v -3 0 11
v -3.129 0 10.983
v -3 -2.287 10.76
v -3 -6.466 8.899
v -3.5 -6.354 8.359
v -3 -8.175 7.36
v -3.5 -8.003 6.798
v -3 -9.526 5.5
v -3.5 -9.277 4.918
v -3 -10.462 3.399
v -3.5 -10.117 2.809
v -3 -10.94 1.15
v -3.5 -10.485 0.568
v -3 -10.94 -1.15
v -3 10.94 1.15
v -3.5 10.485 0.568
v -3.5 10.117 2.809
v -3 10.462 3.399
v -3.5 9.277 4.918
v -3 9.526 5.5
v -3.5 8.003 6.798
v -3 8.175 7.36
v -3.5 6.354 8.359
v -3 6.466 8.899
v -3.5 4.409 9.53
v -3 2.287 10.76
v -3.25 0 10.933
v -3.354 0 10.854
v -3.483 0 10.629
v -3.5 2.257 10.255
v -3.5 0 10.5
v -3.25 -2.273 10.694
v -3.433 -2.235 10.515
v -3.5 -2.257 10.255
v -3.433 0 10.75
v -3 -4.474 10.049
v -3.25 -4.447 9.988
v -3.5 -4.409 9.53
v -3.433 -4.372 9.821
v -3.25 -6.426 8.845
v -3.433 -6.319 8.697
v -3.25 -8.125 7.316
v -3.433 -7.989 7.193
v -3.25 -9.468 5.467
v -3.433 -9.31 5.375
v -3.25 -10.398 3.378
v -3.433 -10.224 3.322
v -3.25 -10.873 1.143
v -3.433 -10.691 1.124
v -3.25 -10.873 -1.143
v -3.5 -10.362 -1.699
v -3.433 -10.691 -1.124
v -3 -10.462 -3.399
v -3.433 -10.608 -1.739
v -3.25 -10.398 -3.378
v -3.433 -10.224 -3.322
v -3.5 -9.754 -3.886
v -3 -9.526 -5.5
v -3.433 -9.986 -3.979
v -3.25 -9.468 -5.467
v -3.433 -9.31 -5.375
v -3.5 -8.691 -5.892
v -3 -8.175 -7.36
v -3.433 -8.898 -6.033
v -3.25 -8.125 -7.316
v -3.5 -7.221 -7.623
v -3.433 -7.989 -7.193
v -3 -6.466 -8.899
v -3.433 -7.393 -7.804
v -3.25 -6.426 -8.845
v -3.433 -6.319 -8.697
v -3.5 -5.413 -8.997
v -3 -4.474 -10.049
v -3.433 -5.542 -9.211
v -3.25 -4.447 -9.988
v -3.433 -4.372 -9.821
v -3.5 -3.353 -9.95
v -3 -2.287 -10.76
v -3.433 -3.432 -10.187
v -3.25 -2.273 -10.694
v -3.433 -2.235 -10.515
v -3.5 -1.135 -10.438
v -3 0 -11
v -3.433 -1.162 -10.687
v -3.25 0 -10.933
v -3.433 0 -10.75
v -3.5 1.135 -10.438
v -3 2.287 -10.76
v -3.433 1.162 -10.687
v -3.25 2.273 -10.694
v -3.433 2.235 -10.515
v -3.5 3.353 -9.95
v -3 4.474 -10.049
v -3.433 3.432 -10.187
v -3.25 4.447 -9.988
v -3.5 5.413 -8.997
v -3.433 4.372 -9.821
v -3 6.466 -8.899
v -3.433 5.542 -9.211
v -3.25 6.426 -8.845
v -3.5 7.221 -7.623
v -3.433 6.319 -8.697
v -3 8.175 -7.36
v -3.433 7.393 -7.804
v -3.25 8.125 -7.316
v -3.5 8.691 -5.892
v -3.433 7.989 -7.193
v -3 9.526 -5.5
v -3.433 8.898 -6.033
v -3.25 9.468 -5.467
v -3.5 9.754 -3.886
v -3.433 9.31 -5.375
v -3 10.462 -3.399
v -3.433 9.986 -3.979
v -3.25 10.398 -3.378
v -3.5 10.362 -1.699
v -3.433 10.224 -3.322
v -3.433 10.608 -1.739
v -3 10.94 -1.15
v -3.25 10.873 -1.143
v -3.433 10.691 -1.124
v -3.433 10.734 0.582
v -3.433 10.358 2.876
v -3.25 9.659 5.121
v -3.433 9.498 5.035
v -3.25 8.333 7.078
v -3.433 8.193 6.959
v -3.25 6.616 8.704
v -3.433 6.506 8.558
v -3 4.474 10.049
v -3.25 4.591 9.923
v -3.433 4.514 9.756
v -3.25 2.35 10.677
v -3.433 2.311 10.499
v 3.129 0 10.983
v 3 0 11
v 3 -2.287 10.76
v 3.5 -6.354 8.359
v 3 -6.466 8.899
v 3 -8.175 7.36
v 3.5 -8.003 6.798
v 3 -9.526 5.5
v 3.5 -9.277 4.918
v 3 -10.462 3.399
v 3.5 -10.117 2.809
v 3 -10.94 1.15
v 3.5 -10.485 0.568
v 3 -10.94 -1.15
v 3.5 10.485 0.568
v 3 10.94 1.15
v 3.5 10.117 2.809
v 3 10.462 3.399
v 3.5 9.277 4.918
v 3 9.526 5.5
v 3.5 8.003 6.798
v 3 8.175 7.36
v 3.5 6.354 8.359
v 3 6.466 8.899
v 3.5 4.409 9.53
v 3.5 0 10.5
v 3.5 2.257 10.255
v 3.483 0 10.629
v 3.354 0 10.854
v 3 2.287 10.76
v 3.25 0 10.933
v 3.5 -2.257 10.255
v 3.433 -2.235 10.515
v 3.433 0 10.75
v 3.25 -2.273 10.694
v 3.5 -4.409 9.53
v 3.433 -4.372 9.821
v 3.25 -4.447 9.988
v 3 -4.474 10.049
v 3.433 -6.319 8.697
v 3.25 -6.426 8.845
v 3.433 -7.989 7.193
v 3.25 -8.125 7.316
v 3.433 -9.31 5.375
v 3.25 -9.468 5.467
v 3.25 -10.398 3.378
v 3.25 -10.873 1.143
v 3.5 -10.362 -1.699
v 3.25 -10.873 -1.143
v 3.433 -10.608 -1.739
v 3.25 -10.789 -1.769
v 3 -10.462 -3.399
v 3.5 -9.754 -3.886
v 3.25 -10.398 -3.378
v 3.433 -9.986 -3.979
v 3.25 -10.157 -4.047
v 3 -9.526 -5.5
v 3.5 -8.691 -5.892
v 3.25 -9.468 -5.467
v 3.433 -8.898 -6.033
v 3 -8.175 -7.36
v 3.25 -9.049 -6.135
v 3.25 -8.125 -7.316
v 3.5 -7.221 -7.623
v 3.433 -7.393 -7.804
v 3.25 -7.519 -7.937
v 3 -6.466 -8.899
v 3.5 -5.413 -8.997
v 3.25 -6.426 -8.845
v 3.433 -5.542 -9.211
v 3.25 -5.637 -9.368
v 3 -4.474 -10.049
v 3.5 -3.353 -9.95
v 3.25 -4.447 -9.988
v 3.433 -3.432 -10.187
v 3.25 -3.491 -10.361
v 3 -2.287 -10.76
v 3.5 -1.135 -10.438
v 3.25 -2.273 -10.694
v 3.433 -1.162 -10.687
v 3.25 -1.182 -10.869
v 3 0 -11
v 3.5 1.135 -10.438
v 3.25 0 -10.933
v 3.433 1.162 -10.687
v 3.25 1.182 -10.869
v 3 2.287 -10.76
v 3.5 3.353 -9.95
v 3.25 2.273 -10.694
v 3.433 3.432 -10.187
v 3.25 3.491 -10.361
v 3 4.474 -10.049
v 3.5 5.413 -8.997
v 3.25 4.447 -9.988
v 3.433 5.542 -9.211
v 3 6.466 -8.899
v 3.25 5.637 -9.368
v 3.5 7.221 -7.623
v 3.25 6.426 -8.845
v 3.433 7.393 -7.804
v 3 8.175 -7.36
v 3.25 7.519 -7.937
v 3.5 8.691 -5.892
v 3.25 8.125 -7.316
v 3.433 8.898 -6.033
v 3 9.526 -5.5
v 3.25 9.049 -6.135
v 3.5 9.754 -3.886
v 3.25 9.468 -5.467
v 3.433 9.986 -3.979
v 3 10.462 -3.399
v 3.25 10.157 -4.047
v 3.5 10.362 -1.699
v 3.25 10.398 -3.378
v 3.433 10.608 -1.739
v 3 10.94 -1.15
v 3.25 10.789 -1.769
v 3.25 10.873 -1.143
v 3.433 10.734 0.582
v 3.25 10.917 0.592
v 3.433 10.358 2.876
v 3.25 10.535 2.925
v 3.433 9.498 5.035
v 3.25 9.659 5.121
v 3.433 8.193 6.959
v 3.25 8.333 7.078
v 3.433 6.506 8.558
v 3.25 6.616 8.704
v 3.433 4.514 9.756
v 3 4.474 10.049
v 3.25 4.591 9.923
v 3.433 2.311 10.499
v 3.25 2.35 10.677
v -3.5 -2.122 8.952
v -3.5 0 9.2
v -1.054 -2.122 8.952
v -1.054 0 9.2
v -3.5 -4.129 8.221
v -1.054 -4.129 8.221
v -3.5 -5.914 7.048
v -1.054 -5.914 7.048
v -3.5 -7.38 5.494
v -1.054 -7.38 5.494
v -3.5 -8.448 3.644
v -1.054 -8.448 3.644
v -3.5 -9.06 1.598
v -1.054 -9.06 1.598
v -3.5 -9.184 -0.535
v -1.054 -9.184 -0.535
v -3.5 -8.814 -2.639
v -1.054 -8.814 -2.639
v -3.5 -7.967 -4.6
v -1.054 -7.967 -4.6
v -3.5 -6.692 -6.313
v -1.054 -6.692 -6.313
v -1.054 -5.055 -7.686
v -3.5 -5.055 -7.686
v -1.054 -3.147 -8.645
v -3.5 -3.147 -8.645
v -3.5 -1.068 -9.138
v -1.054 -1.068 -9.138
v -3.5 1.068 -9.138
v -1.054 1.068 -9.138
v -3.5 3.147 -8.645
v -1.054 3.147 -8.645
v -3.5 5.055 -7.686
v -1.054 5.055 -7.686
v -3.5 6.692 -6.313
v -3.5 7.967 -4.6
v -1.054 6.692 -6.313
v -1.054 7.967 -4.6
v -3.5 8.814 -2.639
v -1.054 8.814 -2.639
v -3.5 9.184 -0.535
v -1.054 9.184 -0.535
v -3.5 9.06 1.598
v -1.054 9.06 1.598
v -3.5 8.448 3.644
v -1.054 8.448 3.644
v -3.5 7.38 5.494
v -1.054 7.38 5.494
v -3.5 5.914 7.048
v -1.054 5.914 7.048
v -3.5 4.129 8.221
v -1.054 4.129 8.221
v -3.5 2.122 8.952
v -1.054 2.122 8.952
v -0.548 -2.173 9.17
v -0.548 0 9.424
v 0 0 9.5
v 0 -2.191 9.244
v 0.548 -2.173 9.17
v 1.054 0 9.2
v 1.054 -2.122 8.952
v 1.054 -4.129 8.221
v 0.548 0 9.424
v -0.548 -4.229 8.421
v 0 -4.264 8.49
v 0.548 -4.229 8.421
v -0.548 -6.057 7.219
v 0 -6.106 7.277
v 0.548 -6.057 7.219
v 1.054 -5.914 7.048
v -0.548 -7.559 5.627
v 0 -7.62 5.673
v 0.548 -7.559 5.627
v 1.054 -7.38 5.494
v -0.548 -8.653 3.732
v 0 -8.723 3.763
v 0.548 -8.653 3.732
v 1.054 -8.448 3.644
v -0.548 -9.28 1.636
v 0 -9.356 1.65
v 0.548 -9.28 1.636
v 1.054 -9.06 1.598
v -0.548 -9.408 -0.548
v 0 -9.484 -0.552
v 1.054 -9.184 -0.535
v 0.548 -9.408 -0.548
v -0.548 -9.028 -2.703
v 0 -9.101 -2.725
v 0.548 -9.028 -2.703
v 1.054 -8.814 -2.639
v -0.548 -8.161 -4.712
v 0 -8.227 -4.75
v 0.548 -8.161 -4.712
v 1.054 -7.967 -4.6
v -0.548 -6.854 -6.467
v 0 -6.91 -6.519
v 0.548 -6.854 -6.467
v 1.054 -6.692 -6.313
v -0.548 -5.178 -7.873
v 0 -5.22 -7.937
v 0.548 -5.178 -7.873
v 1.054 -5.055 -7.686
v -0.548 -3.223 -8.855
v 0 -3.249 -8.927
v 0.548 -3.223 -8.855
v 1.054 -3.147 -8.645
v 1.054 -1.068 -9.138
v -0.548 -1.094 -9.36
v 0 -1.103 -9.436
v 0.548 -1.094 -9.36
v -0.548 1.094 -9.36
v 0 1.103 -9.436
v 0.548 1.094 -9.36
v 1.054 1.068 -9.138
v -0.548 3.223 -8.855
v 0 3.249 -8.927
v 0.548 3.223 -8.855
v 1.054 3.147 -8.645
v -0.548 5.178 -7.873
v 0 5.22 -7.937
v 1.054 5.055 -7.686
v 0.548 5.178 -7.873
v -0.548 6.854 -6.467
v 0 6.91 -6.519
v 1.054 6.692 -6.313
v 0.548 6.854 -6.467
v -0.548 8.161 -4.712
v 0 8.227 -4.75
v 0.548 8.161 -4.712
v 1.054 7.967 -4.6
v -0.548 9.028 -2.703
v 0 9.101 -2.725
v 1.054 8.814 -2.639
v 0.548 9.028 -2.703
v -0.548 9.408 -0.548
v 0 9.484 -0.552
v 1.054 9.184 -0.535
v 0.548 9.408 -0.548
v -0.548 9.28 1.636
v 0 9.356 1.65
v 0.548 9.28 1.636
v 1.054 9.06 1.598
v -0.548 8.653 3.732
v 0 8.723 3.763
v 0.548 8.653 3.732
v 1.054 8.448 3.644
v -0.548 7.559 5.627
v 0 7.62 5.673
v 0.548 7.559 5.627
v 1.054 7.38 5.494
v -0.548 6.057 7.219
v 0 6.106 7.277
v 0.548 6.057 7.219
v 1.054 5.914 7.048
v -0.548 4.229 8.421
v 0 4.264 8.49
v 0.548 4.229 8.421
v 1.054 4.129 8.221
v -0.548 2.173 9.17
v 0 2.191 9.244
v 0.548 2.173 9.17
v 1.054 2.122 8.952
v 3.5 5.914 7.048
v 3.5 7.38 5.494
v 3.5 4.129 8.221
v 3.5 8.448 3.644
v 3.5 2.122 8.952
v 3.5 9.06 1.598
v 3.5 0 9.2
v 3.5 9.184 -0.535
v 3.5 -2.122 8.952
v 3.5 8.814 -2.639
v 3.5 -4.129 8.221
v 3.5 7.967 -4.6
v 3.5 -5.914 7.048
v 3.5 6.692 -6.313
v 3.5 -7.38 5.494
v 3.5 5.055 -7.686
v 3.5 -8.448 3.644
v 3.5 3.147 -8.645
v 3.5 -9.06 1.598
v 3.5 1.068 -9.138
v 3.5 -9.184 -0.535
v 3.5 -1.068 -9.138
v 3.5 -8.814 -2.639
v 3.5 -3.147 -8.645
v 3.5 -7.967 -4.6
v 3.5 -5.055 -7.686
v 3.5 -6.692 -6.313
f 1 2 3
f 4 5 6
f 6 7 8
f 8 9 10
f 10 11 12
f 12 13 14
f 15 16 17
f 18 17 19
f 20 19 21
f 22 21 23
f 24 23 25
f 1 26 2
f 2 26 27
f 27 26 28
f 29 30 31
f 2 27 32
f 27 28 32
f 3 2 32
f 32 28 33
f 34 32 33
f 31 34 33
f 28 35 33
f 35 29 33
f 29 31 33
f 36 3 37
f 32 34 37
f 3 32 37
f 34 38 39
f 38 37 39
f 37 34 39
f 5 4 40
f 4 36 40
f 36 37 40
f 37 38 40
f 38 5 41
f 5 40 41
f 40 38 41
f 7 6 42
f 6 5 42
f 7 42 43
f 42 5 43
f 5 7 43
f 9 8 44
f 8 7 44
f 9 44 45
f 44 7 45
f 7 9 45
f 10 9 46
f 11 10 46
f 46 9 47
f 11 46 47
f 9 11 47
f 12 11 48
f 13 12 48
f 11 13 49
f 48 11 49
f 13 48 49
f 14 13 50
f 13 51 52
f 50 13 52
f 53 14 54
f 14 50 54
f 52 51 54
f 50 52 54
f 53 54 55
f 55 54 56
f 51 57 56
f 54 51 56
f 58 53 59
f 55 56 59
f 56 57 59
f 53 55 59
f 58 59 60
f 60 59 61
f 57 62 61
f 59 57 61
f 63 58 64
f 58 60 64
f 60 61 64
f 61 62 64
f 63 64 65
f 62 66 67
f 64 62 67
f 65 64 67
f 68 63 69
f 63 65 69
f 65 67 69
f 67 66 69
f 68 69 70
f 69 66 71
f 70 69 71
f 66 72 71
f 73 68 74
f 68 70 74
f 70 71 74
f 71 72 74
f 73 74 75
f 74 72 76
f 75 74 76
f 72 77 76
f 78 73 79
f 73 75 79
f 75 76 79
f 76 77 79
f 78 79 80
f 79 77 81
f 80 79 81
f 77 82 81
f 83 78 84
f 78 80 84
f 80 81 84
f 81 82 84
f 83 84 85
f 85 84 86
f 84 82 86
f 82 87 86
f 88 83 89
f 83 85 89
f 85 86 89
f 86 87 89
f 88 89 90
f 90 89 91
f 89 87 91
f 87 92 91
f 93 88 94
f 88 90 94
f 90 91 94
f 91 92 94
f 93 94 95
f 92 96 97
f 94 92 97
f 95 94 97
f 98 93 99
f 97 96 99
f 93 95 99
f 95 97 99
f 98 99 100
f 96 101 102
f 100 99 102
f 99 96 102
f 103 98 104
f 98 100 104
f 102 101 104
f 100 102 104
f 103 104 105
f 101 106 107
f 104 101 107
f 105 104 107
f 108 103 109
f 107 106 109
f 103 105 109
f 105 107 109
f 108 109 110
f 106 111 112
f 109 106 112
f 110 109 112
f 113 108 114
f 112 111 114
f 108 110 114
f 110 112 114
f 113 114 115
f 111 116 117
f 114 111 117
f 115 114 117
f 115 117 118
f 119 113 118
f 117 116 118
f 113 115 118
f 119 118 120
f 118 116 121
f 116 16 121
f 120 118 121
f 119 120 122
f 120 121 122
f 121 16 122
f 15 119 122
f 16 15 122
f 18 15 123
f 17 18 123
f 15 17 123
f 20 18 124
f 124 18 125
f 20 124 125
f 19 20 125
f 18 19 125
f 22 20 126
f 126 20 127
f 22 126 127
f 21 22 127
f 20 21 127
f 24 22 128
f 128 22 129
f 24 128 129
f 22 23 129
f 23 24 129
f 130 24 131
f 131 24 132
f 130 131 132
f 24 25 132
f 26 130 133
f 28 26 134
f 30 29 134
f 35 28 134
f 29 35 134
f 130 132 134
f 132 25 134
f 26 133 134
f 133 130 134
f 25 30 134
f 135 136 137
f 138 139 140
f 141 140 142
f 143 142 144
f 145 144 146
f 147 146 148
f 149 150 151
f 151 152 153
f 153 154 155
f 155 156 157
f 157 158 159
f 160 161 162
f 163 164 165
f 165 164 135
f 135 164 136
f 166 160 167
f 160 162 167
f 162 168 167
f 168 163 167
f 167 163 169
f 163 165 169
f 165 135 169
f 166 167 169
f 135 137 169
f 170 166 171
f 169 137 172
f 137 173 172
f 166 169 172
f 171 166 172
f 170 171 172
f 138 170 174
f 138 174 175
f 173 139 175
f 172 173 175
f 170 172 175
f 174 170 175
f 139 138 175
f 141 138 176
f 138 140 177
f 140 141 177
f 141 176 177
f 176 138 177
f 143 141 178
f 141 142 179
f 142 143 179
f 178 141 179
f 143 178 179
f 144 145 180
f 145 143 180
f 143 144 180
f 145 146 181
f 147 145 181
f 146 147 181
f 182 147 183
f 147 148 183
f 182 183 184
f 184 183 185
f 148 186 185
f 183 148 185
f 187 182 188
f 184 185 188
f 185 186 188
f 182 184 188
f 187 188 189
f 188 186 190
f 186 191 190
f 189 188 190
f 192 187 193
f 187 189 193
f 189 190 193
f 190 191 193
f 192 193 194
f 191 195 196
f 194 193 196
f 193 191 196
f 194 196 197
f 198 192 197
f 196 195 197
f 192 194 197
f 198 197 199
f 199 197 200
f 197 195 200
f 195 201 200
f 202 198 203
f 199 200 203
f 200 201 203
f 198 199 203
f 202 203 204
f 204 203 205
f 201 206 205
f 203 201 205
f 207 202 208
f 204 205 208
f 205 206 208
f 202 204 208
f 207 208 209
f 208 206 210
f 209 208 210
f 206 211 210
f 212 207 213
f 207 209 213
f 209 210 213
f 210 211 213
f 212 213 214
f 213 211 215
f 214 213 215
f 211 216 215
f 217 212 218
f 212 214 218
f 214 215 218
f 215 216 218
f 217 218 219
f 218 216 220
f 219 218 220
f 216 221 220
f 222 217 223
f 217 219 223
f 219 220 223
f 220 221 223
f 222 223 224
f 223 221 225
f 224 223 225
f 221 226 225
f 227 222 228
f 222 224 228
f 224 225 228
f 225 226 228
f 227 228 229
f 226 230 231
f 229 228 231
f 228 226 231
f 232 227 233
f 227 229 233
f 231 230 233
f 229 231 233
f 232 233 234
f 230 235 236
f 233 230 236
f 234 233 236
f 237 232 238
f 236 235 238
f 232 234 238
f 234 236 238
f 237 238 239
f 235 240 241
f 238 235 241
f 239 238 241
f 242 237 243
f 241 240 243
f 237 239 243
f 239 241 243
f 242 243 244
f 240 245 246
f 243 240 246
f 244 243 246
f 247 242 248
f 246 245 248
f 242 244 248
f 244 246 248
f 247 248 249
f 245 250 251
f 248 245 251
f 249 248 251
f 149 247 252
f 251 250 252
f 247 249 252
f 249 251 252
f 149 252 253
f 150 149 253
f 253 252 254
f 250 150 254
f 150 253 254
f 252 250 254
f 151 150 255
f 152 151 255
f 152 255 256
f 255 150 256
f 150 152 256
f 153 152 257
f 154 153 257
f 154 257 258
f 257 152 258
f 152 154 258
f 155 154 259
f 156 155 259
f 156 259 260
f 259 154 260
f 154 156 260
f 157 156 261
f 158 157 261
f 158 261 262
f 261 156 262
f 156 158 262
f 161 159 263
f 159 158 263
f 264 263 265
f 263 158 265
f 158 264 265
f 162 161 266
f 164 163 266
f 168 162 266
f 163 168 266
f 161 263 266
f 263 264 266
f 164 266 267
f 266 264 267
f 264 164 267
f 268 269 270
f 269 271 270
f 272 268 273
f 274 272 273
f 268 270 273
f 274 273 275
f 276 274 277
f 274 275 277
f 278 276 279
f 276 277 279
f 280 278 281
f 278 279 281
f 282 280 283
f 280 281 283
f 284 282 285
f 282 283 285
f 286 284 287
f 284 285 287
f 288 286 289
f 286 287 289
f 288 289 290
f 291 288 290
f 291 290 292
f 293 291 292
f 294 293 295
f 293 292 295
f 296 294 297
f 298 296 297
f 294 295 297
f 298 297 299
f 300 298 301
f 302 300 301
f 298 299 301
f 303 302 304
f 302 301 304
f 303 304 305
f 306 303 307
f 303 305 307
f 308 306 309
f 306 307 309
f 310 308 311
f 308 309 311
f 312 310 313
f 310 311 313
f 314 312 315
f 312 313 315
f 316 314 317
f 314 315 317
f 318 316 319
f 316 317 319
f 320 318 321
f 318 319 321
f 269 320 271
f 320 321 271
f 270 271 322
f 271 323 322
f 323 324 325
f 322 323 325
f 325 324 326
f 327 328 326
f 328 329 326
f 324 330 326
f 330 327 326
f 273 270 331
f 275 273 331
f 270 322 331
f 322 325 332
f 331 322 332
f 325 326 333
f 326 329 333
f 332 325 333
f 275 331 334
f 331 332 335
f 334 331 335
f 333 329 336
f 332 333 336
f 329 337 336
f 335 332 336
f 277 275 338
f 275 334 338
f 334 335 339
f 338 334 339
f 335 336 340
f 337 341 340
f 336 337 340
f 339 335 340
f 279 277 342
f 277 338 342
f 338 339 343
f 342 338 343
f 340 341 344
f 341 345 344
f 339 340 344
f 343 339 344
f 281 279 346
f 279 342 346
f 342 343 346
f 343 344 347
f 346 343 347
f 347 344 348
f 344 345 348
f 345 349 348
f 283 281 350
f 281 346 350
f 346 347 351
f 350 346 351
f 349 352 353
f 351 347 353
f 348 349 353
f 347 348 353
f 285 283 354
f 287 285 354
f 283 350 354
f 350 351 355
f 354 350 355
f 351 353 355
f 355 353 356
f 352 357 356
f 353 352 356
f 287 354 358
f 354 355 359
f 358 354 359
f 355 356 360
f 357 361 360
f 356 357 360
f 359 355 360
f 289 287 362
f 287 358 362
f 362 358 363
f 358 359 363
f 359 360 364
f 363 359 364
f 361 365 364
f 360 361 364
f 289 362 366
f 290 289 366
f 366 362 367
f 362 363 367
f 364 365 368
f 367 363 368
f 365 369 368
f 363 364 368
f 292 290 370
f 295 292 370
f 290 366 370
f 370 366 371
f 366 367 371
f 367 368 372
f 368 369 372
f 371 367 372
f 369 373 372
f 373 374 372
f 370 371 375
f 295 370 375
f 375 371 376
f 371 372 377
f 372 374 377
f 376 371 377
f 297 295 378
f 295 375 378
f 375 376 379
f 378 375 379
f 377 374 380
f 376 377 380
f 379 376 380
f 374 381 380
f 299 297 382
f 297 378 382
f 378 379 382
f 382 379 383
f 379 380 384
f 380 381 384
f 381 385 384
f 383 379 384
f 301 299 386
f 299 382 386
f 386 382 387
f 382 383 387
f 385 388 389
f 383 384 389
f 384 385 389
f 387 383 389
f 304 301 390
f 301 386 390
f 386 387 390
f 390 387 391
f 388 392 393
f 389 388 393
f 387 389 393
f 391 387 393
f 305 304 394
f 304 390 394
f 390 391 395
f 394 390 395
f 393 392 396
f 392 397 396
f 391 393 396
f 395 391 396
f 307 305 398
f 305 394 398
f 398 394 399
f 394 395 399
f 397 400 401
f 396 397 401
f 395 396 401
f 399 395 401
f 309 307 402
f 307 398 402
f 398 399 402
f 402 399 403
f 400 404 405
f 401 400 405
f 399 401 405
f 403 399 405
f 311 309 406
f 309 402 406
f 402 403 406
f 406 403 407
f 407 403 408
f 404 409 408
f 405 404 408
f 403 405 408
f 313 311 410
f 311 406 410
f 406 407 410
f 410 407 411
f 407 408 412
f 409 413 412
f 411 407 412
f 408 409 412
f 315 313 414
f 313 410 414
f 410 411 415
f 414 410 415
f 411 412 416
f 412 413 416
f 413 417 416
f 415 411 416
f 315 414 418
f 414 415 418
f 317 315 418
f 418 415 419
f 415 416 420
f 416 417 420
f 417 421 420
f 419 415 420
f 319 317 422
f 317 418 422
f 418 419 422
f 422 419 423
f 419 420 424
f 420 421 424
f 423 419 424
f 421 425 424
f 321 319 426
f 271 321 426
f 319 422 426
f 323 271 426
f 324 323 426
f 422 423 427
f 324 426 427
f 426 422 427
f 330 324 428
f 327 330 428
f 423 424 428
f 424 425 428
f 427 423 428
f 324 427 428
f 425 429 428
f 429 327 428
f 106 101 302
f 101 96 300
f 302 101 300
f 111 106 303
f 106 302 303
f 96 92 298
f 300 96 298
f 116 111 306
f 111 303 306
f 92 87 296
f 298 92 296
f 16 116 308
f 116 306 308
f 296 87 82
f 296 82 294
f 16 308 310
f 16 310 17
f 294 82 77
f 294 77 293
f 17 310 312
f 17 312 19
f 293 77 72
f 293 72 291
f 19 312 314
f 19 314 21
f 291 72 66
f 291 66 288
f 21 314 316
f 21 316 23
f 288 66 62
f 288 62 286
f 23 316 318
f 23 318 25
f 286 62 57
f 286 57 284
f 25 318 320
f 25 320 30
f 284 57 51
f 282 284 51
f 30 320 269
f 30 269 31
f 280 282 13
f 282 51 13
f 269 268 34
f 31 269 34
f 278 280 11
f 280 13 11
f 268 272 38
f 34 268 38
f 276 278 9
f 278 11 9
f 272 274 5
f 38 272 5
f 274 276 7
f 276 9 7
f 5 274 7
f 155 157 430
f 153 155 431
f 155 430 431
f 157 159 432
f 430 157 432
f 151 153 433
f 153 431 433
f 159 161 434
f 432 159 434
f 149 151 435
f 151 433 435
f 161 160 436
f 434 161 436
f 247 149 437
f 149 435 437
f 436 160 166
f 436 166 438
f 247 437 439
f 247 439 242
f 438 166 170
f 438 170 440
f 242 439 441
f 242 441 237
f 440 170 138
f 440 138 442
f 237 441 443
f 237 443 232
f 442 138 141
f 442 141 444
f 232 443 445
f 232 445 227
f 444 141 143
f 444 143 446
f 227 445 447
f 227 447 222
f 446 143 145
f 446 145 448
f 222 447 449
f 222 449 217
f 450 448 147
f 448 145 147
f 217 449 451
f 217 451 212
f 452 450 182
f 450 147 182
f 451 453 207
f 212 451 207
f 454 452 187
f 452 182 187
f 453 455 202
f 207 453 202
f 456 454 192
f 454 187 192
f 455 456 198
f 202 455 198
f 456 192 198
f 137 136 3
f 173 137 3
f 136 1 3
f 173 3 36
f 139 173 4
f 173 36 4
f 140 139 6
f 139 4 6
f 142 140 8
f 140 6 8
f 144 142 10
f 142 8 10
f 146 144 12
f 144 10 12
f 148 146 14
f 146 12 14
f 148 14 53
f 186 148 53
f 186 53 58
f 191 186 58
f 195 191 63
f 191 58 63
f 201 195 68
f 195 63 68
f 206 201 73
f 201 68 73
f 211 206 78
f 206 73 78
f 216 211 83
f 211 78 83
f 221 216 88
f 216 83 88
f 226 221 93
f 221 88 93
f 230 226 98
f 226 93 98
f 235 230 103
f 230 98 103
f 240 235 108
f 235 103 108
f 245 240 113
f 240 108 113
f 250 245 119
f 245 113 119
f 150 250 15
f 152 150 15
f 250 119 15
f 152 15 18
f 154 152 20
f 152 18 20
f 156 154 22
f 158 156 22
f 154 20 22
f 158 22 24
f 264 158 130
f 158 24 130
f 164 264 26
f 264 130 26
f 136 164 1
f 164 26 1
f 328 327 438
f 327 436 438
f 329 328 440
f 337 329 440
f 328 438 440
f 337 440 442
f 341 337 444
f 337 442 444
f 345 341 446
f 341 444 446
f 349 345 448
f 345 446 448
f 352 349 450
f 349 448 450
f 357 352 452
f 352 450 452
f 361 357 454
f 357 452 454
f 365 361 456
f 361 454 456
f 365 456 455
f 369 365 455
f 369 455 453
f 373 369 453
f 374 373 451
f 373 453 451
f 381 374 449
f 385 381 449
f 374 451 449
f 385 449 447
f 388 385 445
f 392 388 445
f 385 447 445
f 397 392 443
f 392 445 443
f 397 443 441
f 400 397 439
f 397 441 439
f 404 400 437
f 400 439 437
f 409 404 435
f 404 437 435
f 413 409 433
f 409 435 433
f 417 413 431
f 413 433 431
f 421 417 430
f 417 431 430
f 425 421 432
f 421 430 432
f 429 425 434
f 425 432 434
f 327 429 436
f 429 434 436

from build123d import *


with BuildPart() as part:
    # Esquisse1 → Base-Révolution (revolve)
    with BuildSketch(Plane.XY, mode=Mode.PRIVATE) as base_r_volution_sk:
        with BuildLine():
            Line((1.053565375, 9.2), (3.5, 9.2))
            Line((3.5, 9.2), (3.5, 10.5))
            ThreePointArc((3.5, 10.5), (3.353553391, 10.853553391), (3, 11))
            Line((3, 11), (-3, 11))
            ThreePointArc((-3, 11), (-3.353553391, 10.853553391), (-3.5, 10.5))
            Line((-3.5, 10.5), (-3.5, 9.2))
            Line((-3.5, 9.2), (-1.053565375, 9.2))
            ThreePointArc((-1.053565375, 9.2), (0, 9.5), (1.053565375, 9.2))
        make_face()
    revolve(base_r_volution_sk.sketch.rotate(Axis((-4.370908092, 0, 0), (1, 0, 0)), 90), axis=Axis((-4.370908092, 0, 0), (1, 0, 0)))


solid = part.part
